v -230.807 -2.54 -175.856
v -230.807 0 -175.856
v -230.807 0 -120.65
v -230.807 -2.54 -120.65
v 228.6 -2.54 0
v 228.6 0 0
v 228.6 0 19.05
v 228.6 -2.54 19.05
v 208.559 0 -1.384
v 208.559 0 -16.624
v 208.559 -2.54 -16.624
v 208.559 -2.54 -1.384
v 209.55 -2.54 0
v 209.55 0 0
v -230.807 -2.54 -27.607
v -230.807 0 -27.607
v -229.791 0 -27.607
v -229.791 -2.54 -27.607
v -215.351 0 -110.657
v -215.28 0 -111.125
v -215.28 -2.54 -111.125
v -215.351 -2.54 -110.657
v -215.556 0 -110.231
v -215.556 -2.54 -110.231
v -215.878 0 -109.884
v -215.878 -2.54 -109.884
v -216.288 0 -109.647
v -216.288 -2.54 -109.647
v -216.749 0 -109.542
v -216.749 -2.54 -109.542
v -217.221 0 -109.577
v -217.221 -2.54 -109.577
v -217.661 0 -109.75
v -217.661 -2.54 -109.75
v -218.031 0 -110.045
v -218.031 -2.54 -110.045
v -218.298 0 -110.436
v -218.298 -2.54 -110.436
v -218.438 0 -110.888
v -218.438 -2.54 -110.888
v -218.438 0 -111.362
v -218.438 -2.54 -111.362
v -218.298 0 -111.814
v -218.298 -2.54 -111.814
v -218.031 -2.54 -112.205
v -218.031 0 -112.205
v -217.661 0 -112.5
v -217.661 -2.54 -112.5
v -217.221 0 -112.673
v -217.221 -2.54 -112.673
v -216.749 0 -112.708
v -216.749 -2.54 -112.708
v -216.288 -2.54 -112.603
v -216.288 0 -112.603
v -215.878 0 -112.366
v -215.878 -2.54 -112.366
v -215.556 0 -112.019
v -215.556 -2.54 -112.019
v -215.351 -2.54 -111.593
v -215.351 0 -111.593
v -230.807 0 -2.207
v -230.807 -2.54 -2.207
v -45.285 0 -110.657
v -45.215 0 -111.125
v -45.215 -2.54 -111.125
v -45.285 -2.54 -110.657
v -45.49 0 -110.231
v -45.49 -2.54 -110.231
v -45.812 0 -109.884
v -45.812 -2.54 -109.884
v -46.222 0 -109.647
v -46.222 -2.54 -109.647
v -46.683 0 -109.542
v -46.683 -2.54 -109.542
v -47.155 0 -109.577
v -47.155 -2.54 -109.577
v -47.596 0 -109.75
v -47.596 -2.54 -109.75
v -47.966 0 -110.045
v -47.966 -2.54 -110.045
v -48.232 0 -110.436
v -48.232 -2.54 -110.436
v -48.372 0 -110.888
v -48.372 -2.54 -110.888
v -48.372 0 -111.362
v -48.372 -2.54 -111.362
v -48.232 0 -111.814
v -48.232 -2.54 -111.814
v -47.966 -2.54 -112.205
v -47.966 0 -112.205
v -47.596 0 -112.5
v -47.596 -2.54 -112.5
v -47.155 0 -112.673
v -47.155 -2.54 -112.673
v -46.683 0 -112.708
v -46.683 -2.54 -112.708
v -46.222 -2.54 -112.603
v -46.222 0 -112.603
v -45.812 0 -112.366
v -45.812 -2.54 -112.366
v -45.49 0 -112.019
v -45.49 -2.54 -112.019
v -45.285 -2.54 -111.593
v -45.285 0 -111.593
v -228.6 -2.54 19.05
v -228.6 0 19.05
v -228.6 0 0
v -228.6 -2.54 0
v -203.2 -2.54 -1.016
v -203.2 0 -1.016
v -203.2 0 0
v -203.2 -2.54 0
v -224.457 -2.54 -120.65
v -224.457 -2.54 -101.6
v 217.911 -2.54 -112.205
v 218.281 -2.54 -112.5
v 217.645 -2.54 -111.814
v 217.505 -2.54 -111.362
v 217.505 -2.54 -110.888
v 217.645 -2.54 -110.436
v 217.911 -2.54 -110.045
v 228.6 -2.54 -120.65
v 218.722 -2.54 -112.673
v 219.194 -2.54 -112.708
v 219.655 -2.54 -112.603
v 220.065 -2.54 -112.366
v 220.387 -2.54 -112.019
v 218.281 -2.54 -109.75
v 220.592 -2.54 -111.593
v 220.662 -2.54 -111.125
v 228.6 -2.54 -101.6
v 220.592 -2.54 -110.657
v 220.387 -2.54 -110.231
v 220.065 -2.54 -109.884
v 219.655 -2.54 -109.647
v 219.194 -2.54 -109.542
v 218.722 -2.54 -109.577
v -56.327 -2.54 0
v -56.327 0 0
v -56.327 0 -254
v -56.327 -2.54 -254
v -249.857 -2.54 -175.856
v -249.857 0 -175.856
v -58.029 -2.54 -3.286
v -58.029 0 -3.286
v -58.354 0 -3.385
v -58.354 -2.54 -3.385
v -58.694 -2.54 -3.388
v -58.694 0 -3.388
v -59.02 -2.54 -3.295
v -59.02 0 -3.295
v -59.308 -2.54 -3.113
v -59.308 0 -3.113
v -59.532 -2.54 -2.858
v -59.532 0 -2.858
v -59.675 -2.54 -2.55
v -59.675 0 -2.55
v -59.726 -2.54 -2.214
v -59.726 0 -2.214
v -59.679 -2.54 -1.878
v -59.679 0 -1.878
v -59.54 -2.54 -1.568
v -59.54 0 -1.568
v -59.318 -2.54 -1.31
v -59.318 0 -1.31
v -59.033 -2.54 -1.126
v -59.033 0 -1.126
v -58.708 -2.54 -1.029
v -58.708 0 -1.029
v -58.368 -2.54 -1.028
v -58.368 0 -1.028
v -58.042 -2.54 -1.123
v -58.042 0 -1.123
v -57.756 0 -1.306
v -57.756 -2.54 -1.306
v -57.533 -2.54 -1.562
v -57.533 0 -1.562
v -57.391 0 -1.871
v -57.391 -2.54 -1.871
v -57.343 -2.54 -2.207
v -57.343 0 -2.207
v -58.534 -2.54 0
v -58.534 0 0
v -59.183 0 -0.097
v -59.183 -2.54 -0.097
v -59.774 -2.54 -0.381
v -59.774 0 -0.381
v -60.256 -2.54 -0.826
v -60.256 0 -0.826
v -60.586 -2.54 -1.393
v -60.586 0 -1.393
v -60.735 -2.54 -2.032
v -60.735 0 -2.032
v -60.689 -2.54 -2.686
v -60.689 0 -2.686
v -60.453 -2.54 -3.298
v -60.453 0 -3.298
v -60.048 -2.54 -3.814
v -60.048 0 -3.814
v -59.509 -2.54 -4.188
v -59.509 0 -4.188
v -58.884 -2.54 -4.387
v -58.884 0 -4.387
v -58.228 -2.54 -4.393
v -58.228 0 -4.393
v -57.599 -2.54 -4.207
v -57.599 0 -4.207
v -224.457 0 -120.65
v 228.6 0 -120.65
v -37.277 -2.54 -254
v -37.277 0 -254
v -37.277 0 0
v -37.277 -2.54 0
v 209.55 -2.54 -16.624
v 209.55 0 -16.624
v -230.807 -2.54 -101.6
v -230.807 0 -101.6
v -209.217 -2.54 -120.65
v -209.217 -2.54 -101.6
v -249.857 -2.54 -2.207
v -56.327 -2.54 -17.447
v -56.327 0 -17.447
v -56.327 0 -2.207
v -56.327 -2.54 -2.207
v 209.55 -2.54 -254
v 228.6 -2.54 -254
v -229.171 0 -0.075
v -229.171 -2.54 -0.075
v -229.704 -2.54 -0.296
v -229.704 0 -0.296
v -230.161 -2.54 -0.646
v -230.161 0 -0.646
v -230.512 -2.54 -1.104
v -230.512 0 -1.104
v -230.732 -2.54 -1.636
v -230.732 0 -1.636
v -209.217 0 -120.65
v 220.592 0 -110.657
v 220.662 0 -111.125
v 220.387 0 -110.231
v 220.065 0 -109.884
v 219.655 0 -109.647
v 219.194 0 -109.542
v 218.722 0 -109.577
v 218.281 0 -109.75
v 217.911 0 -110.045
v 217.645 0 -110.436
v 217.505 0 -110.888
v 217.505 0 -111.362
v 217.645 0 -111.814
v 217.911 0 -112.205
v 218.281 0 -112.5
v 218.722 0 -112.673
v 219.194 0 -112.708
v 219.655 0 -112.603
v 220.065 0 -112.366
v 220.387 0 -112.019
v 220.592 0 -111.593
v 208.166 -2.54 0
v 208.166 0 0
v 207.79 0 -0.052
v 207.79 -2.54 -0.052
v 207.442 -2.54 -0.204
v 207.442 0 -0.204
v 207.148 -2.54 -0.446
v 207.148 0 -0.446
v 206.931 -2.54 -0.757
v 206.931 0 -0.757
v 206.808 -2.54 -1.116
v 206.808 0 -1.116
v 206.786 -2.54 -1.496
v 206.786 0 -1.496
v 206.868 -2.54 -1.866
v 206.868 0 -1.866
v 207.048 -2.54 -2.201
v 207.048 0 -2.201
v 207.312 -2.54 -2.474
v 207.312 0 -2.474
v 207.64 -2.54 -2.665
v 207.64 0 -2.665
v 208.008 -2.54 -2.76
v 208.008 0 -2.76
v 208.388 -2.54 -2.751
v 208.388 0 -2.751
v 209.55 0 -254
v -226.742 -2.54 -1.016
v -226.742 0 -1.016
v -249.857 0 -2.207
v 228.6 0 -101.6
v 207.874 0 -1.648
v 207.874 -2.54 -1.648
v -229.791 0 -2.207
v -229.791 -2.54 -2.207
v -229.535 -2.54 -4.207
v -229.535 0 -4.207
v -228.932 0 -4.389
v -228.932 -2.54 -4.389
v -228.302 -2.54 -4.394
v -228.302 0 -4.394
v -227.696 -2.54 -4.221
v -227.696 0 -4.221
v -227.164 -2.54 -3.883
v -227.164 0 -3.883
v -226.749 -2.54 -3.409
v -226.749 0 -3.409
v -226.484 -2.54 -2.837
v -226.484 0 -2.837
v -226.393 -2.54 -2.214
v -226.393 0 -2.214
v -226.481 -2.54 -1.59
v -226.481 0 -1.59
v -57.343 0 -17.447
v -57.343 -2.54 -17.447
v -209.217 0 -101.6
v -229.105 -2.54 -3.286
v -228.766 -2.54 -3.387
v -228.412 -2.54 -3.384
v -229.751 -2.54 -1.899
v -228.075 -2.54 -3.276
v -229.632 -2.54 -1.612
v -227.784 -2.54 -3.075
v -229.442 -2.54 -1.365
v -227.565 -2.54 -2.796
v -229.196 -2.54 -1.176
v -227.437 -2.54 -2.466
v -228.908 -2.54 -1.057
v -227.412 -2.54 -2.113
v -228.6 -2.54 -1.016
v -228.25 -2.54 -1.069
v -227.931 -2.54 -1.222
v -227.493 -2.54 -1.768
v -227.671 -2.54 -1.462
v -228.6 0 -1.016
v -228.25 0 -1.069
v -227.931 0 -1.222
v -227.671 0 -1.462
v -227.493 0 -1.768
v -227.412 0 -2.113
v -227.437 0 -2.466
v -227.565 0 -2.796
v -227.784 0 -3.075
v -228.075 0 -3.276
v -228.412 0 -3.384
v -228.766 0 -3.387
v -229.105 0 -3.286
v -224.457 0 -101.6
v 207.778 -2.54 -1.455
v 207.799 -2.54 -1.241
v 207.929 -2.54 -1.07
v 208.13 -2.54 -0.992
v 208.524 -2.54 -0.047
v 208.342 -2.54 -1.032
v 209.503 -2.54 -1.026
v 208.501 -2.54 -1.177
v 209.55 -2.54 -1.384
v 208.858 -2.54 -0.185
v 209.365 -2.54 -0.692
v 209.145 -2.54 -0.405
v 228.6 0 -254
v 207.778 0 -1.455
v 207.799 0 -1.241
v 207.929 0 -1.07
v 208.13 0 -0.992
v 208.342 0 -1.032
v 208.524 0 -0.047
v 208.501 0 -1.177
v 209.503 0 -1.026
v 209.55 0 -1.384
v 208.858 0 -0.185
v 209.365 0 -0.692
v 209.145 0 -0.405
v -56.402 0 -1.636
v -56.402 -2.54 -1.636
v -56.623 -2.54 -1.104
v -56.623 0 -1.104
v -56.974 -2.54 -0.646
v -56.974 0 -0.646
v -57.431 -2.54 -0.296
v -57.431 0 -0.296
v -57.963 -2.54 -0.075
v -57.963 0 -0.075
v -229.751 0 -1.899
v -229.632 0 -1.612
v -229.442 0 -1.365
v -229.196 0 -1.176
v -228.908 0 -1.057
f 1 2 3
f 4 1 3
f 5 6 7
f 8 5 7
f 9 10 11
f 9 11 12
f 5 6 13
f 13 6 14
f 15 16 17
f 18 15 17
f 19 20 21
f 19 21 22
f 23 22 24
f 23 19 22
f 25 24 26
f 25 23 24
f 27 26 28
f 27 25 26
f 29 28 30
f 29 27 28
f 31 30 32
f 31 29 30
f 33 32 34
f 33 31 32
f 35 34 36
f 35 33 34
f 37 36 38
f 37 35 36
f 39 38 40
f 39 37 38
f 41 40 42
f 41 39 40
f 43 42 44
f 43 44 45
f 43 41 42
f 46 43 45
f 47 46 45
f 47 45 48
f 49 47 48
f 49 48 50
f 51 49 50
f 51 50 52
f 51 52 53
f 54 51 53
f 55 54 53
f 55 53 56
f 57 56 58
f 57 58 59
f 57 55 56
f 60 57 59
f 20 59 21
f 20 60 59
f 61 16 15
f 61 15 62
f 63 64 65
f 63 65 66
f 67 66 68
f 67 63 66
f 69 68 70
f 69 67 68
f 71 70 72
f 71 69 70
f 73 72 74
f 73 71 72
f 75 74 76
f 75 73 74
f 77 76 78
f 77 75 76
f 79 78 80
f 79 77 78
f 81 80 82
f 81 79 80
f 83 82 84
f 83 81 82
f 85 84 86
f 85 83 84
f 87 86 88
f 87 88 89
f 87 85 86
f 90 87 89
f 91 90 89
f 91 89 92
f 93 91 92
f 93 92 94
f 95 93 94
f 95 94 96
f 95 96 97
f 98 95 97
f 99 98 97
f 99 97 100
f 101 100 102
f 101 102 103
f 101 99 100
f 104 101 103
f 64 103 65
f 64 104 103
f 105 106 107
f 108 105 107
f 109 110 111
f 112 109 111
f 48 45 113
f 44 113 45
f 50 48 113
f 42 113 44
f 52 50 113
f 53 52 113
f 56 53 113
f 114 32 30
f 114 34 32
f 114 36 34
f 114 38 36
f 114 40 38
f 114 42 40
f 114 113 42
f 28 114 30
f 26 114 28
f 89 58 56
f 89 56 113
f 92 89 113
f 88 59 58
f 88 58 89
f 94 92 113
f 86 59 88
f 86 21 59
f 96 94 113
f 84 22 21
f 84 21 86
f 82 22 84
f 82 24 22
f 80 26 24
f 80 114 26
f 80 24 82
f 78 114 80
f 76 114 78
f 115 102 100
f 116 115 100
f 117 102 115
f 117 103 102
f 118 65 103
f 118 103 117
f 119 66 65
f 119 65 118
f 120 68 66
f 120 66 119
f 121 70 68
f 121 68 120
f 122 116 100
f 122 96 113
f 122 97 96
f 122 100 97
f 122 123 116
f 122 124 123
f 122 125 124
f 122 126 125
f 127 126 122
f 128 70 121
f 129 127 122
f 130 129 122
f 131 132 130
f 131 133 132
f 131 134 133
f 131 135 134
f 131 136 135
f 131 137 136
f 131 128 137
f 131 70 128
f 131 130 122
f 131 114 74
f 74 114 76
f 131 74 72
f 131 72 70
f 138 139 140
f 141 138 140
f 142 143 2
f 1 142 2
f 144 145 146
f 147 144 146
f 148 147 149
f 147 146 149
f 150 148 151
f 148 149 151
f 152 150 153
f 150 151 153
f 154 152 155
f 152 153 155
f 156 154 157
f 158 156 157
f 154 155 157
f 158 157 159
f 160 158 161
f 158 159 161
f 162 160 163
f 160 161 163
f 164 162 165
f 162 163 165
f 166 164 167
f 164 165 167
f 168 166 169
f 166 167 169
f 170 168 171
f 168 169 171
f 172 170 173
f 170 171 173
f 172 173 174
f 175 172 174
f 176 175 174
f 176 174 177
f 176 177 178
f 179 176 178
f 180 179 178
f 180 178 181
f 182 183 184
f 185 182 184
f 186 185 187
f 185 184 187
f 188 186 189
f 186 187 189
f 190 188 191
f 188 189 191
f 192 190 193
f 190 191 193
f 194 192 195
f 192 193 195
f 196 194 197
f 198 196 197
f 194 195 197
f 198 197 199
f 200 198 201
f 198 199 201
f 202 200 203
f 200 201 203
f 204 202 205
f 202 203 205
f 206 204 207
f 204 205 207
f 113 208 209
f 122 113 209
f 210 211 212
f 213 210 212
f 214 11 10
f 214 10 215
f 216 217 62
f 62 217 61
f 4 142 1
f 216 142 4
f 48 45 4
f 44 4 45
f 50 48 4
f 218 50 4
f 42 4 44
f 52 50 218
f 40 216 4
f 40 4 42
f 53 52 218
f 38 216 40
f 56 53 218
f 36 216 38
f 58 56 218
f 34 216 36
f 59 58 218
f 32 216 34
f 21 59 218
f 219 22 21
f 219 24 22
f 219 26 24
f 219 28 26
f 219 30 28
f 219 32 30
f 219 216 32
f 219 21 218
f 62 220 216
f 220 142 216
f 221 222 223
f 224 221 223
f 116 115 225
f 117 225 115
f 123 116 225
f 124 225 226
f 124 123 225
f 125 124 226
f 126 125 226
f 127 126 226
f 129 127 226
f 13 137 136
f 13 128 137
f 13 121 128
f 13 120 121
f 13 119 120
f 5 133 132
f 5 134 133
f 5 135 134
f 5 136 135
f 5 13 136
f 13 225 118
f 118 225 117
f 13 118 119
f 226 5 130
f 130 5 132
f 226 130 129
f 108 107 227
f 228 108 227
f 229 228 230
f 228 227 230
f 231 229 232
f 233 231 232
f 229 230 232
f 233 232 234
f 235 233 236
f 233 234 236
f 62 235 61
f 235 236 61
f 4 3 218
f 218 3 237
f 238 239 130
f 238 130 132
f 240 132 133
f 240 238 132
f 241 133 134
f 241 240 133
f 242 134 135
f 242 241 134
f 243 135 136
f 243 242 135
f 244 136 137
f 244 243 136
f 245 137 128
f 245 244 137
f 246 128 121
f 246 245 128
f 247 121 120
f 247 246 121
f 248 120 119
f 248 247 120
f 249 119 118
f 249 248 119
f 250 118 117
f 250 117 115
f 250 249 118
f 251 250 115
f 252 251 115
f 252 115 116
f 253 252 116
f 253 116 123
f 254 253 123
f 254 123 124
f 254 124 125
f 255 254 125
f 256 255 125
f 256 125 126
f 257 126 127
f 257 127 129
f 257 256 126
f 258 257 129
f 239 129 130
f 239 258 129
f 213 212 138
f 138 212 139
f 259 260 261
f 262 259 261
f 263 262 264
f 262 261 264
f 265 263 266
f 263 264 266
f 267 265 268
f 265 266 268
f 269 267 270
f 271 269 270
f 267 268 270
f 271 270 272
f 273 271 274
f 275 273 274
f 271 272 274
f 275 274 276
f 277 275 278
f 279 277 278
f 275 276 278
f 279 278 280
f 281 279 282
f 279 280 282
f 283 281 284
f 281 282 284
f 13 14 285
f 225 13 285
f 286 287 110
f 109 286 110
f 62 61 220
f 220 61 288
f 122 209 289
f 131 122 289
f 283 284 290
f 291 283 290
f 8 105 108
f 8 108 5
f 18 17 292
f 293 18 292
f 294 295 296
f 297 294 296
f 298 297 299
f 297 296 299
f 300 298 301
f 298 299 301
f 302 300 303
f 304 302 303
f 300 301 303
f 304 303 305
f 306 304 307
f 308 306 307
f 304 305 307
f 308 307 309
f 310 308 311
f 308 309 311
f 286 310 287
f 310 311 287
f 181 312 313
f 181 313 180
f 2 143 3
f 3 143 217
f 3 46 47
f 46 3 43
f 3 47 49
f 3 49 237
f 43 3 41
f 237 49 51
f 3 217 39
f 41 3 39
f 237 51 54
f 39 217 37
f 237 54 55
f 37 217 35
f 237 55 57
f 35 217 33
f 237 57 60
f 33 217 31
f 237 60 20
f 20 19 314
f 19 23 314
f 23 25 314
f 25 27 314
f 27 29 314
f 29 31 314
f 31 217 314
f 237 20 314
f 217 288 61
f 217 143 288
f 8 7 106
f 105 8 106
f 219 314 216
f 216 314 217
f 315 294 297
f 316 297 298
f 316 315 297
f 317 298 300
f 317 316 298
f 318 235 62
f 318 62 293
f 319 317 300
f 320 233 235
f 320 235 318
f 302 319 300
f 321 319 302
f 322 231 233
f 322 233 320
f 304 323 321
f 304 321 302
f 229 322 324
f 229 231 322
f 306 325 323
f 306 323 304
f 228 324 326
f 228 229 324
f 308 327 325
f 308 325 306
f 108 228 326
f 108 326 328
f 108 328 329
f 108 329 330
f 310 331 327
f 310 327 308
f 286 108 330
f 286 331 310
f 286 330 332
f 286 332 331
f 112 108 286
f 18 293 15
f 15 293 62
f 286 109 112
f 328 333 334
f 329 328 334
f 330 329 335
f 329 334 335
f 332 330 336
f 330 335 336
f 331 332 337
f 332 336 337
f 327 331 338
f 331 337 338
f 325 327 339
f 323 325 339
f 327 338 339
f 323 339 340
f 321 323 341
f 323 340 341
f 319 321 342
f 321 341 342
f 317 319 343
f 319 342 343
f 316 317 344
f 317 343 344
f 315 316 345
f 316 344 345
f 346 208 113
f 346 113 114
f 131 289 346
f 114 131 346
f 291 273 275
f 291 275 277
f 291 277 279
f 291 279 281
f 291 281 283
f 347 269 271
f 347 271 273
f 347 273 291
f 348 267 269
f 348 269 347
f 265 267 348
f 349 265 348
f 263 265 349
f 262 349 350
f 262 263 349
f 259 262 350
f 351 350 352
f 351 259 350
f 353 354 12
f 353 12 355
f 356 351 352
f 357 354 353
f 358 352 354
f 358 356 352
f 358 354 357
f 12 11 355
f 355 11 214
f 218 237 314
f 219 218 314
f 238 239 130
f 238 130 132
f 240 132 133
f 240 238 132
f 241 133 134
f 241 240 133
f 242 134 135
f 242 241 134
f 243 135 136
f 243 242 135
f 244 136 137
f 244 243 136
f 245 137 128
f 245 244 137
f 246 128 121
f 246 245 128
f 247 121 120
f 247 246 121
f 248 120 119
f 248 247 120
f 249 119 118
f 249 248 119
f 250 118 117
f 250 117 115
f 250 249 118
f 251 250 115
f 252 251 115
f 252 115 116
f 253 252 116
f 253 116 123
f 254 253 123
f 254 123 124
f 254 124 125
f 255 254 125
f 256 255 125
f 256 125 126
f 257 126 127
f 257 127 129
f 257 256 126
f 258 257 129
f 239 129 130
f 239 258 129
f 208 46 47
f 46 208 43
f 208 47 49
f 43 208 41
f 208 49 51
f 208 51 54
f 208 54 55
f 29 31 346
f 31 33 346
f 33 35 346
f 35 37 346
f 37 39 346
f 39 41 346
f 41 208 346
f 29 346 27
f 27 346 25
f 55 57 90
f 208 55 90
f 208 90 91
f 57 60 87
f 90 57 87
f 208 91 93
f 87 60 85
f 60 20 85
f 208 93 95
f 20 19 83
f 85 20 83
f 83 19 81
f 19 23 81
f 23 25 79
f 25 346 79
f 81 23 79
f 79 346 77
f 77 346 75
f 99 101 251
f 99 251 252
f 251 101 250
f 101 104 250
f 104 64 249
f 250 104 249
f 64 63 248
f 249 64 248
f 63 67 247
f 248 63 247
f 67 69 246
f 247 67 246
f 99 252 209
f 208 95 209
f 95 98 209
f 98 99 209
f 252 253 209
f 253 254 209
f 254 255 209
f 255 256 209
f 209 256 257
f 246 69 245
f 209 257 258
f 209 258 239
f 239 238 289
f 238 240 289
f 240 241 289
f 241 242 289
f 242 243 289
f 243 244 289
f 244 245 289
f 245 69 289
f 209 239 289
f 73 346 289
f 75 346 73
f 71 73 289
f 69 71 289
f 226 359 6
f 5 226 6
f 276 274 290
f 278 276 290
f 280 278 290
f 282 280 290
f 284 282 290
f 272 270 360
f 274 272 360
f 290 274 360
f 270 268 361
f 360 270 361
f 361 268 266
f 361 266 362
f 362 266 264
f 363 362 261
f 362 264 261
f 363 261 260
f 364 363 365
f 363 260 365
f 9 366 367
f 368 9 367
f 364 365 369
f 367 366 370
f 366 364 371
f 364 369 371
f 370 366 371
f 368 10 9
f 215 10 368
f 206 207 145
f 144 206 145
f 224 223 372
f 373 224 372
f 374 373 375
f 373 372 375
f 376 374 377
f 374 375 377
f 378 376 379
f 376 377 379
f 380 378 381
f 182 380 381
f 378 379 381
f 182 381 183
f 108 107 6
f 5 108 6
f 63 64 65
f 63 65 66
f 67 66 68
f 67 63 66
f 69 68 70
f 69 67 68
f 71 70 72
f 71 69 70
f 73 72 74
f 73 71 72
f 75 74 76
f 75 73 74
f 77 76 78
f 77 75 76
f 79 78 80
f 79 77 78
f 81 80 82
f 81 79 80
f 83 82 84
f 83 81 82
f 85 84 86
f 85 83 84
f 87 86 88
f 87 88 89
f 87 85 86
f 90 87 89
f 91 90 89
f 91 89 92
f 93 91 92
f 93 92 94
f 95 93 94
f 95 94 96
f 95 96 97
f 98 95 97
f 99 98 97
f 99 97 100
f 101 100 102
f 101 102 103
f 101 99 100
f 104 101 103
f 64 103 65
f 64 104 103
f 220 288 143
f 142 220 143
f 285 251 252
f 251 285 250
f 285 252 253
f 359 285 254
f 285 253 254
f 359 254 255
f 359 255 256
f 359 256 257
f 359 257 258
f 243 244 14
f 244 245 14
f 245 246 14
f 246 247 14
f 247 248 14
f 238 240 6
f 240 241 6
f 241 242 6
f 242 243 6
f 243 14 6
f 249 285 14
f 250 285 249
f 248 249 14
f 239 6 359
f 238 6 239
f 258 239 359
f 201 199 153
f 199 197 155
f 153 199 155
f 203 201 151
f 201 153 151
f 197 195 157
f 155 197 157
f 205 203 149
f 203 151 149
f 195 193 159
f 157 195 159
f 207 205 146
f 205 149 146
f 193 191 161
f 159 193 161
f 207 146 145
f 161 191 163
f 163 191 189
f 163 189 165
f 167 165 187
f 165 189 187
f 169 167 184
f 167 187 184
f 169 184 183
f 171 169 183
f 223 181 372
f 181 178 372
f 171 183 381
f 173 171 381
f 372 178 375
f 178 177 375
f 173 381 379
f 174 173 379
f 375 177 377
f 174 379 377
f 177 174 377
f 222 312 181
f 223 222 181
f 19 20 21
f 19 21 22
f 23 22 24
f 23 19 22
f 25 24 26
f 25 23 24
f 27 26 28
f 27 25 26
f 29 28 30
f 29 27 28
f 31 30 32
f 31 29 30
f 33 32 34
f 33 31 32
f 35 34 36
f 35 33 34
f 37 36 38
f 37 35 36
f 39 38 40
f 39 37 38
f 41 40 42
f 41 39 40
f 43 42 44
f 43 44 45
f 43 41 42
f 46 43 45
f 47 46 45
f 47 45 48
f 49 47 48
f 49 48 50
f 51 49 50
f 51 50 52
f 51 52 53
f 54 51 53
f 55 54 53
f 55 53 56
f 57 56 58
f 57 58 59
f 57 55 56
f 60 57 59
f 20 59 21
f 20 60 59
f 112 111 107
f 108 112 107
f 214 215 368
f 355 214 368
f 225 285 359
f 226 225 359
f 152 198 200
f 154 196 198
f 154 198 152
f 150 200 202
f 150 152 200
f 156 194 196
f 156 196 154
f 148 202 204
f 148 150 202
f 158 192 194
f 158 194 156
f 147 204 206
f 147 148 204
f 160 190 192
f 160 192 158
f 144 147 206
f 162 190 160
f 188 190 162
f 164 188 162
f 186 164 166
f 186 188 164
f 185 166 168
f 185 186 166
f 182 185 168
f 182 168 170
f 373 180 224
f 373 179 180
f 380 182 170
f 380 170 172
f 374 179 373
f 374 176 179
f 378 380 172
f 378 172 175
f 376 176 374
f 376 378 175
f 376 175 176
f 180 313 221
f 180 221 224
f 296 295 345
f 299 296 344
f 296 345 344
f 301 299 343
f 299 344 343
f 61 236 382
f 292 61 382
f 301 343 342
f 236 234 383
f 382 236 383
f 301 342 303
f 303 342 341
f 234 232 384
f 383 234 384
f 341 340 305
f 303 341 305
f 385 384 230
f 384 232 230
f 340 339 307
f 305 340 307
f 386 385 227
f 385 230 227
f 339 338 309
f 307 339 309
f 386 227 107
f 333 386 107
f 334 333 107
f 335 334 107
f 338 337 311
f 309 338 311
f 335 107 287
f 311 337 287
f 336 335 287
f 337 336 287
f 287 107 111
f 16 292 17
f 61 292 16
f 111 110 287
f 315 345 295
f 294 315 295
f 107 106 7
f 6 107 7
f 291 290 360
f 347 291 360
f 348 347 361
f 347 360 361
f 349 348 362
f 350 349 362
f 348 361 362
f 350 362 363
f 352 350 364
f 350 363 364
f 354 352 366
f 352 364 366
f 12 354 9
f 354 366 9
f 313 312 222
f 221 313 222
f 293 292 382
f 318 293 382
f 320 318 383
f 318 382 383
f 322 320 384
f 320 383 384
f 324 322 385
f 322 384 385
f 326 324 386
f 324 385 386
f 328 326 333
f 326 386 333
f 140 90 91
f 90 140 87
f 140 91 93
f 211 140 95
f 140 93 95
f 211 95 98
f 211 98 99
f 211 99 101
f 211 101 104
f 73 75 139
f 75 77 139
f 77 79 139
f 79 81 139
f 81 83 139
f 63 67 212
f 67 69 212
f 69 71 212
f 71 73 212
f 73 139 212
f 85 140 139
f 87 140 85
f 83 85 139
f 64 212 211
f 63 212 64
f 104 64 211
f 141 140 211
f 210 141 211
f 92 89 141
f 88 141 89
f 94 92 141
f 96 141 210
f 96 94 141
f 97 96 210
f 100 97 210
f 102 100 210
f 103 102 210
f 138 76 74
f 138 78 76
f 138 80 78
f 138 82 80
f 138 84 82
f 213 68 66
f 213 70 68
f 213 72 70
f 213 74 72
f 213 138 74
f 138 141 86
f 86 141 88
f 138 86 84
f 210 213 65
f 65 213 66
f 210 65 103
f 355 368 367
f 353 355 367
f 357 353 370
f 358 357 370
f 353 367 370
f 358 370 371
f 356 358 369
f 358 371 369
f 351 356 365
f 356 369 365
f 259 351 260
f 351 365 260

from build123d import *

# Parameters (mm, degrees)
F0_W     = 19.05
F0_H     = 19.05
F0_R     = 1.5875
F0_W_2   = 246.82704
F0_W_3   = 152.89022
F0_W_4   = 15.24
F1_DEPTH = 2.54
F2_DEPTH = 2.54
F0_H_2   = 133.35
F3_DEPTH = 2.54
F4_DEPTH = 2.54
F0_H_3   = 55.2061730385
F0_W_5   = 6.35
F5_DEPTH = 2.54
F0_W_6   = 0.9906
F0_H_4   = 15.24
F6_DEPTH = 2.54
F0_W_7   = 1.016
F7_DEPTH = 2.54
F0_H_5   = 25.4
F8_DEPTH = 2.54


with BuildPart() as f1:
    # F0 (on Front) → F1 (new body)
    with BuildSketch(Plane.XZ):
        with Locations((219.075, -111.125)):
            Rectangle(F0_W, F0_H)
        with Locations((219.075, -111.125)):
            Circle(F0_R, mode=Mode.SUBTRACT)
        with Locations((86.13648, -111.125)):
            Rectangle(F0_W_2, F0_H)
        with Locations((-46.80204, -111.125)):
            Rectangle(F0_W, F0_H)
        with Locations((-46.80204, -111.125)):
            Circle(F0_R, mode=Mode.SUBTRACT)
        with Locations((-132.77215, -111.125)):
            Rectangle(F0_W_3, F0_H)
        with Locations((-216.83726, -111.125)):
            Rectangle(F0_W_4, F0_H)
        with Locations((-216.86774, -111.125)):
            Circle(F0_R, mode=Mode.SUBTRACT)
    extrude(amount=F1_DEPTH)


with BuildPart() as f2:
    # F0 (on Front) → F2 (new body)
    with BuildSketch(Plane.XZ):
        Polygon((228.6, 19.05), (-228.6, 19.05), (-228.6, 0), (-203.2, 0), (-58.5342999945, 0), (-56.32704, 0), (-37.27704, 0), (208.1656999991, 0), (209.55, 0), (228.6, 0), align=None)
    extrude(amount=F2_DEPTH)


with BuildPart() as f3:
    # F0 (on Front) → F3 (new body)
    with BuildSketch(Plane.XZ):
        Polygon((228.6, -101.6), (228.6, 0), (209.55, 0), (209.55, -1.3843), (209.55, -16.6243), (209.55, -101.6), align=None)
        with Locations((219.075, -111.125)):
            Rectangle(F0_W, F0_H)
        with Locations((219.075, -111.125)):
            Circle(F0_R, mode=Mode.SUBTRACT)
        with Locations((219.075, -187.325)):
            Rectangle(F0_W, F0_H_2)
    extrude(amount=F3_DEPTH)


with BuildPart() as f4:
    # F0 (on Front) → F4 (new body)
    with BuildSketch(Plane.XZ):
        Polygon((-37.27704, 0), (-56.32704, 0), (-56.32704, -2.20726), (-56.32704, -17.44726), (-56.32704, -101.6), (-37.27704, -101.6), align=None)
        with Locations((-46.80204, -111.125)):
            Rectangle(F0_W, F0_H)
        with Locations((-46.80204, -111.125)):
            Circle(F0_R, mode=Mode.SUBTRACT)
        with Locations((-46.80204, -187.325)):
            Rectangle(F0_W, F0_H_2)
    extrude(amount=F4_DEPTH)


with BuildPart() as f5:
    # F0 (on Front) → F5 (new body)
    with BuildSketch(Plane.XZ):
        Polygon((-230.80726, -27.60726), (-230.80726, -2.20726), (-249.85726, -2.20726), (-249.85726, -101.6), (-230.80726, -101.6), align=None)
        with Locations((-240.33226, -111.125)):
            Rectangle(F0_W, F0_H)
        with Locations((-240.33226, -148.2530865192)):
            Rectangle(F0_W, F0_H_3)
        with Locations((-227.63226, -111.125)):
            Rectangle(F0_W_5, F0_H)
        with Locations((-216.83726, -111.125)):
            Rectangle(F0_W_4, F0_H)
        with Locations((-216.86774, -111.125)):
            Circle(F0_R, mode=Mode.SUBTRACT)
    extrude(amount=F5_DEPTH)


with BuildPart() as f6:
    # F0 (on Front) → F6 (new body)
    with BuildSketch(Plane.XZ):
        with Locations((209.0547, -9.0043)):
            Rectangle(F0_W_6, F0_H_4)
        with BuildLine():
            ThreePointArc((209.55, -1.3843), (209.1445479169, -0.4054520825), (208.1656999991, 0))
            ThreePointArc((208.1656999991, 0), (206.7858852401, -1.4956450418), (208.3876685494, -2.7506881049))
            Line((208.3876685494, -2.7506881049), (207.8736, -1.6482645431))
            ThreePointArc((207.8736, -1.6482645431), (208.0242787852, -1.016876906), (208.5594, -1.3843))
            Line((208.5594, -1.3843), (209.55, -1.3843))
        make_face()
    extrude(amount=F6_DEPTH)


with BuildPart() as f7:
    # F0 (on Front) → F7 (new body)
    with BuildSketch(Plane.XZ):
        with Locations((-56.83504, -9.82726)):
            Rectangle(F0_W_7, F0_H_4)
        with BuildLine():
            ThreePointArc((-56.32704, -2.20726), (-56.9735314842, -0.6464914881), (-58.5342999945, 0))
            ThreePointArc((-58.5342999945, 0), (-60.6889985281, -2.6860824731), (-57.5994594434, -4.2067774021))
            Line((-57.5994594434, -4.2067774021), (-58.02884, -3.285967827))
            ThreePointArc((-58.02884, -3.285967827), (-59.5395946501, -1.5681332098), (-57.34304, -2.20726))
            Line((-57.34304, -2.20726), (-56.32704, -2.20726))
        make_face()
    extrude(amount=F7_DEPTH)


with BuildPart() as f8:
    # F0 (on Front) → F8 (new body)
    with BuildSketch(Plane.XZ):
        with BuildLine():
            Line((-203.2, 0), (-228.6, 0))
            ThreePointArc((-228.6, 0), (-227.5410910898, -0.2705853687), (-226.7418029383, -1.016))
            Line((-226.7418029383, -1.016), (-203.2, -1.016))
            Line((-203.2, -1.016), (-203.2, 0))
        make_face()
        with BuildLine():
            ThreePointArc((-229.5348405566, -4.2067774021), (-226.9391532532, -3.661077317), (-226.7418029383, -1.016))
            Line((-226.7418029383, -1.016), (-228.6, -1.016))
            ThreePointArc((-228.6, -1.016), (-227.4372184484, -2.4661797768), (-229.10546, -3.285967827))
            Line((-229.10546, -3.285967827), (-229.5348405566, -4.2067774021))
        make_face()
        with BuildLine():
            ThreePointArc((-226.7418029383, -1.016), (-227.5410910898, -0.2705853687), (-228.6, 0))
            Line((-228.6, 0), (-228.6, -1.016))
            Line((-228.6, -1.016), (-226.7418029383, -1.016))
        make_face()
        with BuildLine():
            Line((-228.6, -1.016), (-228.6, 0))
            ThreePointArc((-228.6, 0), (-230.1607685138, -0.6464914862), (-230.80726, -2.20726))
            Line((-230.80726, -2.20726), (-229.79126, -2.20726))
            ThreePointArc((-229.79126, -2.20726), (-229.4423480242, -1.3649119758), (-228.6, -1.016))
        make_face()
        with Locations((-230.29926, -14.90726)):
            Rectangle(F0_W_7, F0_H_5)
    extrude(amount=F8_DEPTH)


solid = Compound([f1.part, f2.part, f3.part, f4.part, f5.part, f6.part, f7.part, f8.part])
